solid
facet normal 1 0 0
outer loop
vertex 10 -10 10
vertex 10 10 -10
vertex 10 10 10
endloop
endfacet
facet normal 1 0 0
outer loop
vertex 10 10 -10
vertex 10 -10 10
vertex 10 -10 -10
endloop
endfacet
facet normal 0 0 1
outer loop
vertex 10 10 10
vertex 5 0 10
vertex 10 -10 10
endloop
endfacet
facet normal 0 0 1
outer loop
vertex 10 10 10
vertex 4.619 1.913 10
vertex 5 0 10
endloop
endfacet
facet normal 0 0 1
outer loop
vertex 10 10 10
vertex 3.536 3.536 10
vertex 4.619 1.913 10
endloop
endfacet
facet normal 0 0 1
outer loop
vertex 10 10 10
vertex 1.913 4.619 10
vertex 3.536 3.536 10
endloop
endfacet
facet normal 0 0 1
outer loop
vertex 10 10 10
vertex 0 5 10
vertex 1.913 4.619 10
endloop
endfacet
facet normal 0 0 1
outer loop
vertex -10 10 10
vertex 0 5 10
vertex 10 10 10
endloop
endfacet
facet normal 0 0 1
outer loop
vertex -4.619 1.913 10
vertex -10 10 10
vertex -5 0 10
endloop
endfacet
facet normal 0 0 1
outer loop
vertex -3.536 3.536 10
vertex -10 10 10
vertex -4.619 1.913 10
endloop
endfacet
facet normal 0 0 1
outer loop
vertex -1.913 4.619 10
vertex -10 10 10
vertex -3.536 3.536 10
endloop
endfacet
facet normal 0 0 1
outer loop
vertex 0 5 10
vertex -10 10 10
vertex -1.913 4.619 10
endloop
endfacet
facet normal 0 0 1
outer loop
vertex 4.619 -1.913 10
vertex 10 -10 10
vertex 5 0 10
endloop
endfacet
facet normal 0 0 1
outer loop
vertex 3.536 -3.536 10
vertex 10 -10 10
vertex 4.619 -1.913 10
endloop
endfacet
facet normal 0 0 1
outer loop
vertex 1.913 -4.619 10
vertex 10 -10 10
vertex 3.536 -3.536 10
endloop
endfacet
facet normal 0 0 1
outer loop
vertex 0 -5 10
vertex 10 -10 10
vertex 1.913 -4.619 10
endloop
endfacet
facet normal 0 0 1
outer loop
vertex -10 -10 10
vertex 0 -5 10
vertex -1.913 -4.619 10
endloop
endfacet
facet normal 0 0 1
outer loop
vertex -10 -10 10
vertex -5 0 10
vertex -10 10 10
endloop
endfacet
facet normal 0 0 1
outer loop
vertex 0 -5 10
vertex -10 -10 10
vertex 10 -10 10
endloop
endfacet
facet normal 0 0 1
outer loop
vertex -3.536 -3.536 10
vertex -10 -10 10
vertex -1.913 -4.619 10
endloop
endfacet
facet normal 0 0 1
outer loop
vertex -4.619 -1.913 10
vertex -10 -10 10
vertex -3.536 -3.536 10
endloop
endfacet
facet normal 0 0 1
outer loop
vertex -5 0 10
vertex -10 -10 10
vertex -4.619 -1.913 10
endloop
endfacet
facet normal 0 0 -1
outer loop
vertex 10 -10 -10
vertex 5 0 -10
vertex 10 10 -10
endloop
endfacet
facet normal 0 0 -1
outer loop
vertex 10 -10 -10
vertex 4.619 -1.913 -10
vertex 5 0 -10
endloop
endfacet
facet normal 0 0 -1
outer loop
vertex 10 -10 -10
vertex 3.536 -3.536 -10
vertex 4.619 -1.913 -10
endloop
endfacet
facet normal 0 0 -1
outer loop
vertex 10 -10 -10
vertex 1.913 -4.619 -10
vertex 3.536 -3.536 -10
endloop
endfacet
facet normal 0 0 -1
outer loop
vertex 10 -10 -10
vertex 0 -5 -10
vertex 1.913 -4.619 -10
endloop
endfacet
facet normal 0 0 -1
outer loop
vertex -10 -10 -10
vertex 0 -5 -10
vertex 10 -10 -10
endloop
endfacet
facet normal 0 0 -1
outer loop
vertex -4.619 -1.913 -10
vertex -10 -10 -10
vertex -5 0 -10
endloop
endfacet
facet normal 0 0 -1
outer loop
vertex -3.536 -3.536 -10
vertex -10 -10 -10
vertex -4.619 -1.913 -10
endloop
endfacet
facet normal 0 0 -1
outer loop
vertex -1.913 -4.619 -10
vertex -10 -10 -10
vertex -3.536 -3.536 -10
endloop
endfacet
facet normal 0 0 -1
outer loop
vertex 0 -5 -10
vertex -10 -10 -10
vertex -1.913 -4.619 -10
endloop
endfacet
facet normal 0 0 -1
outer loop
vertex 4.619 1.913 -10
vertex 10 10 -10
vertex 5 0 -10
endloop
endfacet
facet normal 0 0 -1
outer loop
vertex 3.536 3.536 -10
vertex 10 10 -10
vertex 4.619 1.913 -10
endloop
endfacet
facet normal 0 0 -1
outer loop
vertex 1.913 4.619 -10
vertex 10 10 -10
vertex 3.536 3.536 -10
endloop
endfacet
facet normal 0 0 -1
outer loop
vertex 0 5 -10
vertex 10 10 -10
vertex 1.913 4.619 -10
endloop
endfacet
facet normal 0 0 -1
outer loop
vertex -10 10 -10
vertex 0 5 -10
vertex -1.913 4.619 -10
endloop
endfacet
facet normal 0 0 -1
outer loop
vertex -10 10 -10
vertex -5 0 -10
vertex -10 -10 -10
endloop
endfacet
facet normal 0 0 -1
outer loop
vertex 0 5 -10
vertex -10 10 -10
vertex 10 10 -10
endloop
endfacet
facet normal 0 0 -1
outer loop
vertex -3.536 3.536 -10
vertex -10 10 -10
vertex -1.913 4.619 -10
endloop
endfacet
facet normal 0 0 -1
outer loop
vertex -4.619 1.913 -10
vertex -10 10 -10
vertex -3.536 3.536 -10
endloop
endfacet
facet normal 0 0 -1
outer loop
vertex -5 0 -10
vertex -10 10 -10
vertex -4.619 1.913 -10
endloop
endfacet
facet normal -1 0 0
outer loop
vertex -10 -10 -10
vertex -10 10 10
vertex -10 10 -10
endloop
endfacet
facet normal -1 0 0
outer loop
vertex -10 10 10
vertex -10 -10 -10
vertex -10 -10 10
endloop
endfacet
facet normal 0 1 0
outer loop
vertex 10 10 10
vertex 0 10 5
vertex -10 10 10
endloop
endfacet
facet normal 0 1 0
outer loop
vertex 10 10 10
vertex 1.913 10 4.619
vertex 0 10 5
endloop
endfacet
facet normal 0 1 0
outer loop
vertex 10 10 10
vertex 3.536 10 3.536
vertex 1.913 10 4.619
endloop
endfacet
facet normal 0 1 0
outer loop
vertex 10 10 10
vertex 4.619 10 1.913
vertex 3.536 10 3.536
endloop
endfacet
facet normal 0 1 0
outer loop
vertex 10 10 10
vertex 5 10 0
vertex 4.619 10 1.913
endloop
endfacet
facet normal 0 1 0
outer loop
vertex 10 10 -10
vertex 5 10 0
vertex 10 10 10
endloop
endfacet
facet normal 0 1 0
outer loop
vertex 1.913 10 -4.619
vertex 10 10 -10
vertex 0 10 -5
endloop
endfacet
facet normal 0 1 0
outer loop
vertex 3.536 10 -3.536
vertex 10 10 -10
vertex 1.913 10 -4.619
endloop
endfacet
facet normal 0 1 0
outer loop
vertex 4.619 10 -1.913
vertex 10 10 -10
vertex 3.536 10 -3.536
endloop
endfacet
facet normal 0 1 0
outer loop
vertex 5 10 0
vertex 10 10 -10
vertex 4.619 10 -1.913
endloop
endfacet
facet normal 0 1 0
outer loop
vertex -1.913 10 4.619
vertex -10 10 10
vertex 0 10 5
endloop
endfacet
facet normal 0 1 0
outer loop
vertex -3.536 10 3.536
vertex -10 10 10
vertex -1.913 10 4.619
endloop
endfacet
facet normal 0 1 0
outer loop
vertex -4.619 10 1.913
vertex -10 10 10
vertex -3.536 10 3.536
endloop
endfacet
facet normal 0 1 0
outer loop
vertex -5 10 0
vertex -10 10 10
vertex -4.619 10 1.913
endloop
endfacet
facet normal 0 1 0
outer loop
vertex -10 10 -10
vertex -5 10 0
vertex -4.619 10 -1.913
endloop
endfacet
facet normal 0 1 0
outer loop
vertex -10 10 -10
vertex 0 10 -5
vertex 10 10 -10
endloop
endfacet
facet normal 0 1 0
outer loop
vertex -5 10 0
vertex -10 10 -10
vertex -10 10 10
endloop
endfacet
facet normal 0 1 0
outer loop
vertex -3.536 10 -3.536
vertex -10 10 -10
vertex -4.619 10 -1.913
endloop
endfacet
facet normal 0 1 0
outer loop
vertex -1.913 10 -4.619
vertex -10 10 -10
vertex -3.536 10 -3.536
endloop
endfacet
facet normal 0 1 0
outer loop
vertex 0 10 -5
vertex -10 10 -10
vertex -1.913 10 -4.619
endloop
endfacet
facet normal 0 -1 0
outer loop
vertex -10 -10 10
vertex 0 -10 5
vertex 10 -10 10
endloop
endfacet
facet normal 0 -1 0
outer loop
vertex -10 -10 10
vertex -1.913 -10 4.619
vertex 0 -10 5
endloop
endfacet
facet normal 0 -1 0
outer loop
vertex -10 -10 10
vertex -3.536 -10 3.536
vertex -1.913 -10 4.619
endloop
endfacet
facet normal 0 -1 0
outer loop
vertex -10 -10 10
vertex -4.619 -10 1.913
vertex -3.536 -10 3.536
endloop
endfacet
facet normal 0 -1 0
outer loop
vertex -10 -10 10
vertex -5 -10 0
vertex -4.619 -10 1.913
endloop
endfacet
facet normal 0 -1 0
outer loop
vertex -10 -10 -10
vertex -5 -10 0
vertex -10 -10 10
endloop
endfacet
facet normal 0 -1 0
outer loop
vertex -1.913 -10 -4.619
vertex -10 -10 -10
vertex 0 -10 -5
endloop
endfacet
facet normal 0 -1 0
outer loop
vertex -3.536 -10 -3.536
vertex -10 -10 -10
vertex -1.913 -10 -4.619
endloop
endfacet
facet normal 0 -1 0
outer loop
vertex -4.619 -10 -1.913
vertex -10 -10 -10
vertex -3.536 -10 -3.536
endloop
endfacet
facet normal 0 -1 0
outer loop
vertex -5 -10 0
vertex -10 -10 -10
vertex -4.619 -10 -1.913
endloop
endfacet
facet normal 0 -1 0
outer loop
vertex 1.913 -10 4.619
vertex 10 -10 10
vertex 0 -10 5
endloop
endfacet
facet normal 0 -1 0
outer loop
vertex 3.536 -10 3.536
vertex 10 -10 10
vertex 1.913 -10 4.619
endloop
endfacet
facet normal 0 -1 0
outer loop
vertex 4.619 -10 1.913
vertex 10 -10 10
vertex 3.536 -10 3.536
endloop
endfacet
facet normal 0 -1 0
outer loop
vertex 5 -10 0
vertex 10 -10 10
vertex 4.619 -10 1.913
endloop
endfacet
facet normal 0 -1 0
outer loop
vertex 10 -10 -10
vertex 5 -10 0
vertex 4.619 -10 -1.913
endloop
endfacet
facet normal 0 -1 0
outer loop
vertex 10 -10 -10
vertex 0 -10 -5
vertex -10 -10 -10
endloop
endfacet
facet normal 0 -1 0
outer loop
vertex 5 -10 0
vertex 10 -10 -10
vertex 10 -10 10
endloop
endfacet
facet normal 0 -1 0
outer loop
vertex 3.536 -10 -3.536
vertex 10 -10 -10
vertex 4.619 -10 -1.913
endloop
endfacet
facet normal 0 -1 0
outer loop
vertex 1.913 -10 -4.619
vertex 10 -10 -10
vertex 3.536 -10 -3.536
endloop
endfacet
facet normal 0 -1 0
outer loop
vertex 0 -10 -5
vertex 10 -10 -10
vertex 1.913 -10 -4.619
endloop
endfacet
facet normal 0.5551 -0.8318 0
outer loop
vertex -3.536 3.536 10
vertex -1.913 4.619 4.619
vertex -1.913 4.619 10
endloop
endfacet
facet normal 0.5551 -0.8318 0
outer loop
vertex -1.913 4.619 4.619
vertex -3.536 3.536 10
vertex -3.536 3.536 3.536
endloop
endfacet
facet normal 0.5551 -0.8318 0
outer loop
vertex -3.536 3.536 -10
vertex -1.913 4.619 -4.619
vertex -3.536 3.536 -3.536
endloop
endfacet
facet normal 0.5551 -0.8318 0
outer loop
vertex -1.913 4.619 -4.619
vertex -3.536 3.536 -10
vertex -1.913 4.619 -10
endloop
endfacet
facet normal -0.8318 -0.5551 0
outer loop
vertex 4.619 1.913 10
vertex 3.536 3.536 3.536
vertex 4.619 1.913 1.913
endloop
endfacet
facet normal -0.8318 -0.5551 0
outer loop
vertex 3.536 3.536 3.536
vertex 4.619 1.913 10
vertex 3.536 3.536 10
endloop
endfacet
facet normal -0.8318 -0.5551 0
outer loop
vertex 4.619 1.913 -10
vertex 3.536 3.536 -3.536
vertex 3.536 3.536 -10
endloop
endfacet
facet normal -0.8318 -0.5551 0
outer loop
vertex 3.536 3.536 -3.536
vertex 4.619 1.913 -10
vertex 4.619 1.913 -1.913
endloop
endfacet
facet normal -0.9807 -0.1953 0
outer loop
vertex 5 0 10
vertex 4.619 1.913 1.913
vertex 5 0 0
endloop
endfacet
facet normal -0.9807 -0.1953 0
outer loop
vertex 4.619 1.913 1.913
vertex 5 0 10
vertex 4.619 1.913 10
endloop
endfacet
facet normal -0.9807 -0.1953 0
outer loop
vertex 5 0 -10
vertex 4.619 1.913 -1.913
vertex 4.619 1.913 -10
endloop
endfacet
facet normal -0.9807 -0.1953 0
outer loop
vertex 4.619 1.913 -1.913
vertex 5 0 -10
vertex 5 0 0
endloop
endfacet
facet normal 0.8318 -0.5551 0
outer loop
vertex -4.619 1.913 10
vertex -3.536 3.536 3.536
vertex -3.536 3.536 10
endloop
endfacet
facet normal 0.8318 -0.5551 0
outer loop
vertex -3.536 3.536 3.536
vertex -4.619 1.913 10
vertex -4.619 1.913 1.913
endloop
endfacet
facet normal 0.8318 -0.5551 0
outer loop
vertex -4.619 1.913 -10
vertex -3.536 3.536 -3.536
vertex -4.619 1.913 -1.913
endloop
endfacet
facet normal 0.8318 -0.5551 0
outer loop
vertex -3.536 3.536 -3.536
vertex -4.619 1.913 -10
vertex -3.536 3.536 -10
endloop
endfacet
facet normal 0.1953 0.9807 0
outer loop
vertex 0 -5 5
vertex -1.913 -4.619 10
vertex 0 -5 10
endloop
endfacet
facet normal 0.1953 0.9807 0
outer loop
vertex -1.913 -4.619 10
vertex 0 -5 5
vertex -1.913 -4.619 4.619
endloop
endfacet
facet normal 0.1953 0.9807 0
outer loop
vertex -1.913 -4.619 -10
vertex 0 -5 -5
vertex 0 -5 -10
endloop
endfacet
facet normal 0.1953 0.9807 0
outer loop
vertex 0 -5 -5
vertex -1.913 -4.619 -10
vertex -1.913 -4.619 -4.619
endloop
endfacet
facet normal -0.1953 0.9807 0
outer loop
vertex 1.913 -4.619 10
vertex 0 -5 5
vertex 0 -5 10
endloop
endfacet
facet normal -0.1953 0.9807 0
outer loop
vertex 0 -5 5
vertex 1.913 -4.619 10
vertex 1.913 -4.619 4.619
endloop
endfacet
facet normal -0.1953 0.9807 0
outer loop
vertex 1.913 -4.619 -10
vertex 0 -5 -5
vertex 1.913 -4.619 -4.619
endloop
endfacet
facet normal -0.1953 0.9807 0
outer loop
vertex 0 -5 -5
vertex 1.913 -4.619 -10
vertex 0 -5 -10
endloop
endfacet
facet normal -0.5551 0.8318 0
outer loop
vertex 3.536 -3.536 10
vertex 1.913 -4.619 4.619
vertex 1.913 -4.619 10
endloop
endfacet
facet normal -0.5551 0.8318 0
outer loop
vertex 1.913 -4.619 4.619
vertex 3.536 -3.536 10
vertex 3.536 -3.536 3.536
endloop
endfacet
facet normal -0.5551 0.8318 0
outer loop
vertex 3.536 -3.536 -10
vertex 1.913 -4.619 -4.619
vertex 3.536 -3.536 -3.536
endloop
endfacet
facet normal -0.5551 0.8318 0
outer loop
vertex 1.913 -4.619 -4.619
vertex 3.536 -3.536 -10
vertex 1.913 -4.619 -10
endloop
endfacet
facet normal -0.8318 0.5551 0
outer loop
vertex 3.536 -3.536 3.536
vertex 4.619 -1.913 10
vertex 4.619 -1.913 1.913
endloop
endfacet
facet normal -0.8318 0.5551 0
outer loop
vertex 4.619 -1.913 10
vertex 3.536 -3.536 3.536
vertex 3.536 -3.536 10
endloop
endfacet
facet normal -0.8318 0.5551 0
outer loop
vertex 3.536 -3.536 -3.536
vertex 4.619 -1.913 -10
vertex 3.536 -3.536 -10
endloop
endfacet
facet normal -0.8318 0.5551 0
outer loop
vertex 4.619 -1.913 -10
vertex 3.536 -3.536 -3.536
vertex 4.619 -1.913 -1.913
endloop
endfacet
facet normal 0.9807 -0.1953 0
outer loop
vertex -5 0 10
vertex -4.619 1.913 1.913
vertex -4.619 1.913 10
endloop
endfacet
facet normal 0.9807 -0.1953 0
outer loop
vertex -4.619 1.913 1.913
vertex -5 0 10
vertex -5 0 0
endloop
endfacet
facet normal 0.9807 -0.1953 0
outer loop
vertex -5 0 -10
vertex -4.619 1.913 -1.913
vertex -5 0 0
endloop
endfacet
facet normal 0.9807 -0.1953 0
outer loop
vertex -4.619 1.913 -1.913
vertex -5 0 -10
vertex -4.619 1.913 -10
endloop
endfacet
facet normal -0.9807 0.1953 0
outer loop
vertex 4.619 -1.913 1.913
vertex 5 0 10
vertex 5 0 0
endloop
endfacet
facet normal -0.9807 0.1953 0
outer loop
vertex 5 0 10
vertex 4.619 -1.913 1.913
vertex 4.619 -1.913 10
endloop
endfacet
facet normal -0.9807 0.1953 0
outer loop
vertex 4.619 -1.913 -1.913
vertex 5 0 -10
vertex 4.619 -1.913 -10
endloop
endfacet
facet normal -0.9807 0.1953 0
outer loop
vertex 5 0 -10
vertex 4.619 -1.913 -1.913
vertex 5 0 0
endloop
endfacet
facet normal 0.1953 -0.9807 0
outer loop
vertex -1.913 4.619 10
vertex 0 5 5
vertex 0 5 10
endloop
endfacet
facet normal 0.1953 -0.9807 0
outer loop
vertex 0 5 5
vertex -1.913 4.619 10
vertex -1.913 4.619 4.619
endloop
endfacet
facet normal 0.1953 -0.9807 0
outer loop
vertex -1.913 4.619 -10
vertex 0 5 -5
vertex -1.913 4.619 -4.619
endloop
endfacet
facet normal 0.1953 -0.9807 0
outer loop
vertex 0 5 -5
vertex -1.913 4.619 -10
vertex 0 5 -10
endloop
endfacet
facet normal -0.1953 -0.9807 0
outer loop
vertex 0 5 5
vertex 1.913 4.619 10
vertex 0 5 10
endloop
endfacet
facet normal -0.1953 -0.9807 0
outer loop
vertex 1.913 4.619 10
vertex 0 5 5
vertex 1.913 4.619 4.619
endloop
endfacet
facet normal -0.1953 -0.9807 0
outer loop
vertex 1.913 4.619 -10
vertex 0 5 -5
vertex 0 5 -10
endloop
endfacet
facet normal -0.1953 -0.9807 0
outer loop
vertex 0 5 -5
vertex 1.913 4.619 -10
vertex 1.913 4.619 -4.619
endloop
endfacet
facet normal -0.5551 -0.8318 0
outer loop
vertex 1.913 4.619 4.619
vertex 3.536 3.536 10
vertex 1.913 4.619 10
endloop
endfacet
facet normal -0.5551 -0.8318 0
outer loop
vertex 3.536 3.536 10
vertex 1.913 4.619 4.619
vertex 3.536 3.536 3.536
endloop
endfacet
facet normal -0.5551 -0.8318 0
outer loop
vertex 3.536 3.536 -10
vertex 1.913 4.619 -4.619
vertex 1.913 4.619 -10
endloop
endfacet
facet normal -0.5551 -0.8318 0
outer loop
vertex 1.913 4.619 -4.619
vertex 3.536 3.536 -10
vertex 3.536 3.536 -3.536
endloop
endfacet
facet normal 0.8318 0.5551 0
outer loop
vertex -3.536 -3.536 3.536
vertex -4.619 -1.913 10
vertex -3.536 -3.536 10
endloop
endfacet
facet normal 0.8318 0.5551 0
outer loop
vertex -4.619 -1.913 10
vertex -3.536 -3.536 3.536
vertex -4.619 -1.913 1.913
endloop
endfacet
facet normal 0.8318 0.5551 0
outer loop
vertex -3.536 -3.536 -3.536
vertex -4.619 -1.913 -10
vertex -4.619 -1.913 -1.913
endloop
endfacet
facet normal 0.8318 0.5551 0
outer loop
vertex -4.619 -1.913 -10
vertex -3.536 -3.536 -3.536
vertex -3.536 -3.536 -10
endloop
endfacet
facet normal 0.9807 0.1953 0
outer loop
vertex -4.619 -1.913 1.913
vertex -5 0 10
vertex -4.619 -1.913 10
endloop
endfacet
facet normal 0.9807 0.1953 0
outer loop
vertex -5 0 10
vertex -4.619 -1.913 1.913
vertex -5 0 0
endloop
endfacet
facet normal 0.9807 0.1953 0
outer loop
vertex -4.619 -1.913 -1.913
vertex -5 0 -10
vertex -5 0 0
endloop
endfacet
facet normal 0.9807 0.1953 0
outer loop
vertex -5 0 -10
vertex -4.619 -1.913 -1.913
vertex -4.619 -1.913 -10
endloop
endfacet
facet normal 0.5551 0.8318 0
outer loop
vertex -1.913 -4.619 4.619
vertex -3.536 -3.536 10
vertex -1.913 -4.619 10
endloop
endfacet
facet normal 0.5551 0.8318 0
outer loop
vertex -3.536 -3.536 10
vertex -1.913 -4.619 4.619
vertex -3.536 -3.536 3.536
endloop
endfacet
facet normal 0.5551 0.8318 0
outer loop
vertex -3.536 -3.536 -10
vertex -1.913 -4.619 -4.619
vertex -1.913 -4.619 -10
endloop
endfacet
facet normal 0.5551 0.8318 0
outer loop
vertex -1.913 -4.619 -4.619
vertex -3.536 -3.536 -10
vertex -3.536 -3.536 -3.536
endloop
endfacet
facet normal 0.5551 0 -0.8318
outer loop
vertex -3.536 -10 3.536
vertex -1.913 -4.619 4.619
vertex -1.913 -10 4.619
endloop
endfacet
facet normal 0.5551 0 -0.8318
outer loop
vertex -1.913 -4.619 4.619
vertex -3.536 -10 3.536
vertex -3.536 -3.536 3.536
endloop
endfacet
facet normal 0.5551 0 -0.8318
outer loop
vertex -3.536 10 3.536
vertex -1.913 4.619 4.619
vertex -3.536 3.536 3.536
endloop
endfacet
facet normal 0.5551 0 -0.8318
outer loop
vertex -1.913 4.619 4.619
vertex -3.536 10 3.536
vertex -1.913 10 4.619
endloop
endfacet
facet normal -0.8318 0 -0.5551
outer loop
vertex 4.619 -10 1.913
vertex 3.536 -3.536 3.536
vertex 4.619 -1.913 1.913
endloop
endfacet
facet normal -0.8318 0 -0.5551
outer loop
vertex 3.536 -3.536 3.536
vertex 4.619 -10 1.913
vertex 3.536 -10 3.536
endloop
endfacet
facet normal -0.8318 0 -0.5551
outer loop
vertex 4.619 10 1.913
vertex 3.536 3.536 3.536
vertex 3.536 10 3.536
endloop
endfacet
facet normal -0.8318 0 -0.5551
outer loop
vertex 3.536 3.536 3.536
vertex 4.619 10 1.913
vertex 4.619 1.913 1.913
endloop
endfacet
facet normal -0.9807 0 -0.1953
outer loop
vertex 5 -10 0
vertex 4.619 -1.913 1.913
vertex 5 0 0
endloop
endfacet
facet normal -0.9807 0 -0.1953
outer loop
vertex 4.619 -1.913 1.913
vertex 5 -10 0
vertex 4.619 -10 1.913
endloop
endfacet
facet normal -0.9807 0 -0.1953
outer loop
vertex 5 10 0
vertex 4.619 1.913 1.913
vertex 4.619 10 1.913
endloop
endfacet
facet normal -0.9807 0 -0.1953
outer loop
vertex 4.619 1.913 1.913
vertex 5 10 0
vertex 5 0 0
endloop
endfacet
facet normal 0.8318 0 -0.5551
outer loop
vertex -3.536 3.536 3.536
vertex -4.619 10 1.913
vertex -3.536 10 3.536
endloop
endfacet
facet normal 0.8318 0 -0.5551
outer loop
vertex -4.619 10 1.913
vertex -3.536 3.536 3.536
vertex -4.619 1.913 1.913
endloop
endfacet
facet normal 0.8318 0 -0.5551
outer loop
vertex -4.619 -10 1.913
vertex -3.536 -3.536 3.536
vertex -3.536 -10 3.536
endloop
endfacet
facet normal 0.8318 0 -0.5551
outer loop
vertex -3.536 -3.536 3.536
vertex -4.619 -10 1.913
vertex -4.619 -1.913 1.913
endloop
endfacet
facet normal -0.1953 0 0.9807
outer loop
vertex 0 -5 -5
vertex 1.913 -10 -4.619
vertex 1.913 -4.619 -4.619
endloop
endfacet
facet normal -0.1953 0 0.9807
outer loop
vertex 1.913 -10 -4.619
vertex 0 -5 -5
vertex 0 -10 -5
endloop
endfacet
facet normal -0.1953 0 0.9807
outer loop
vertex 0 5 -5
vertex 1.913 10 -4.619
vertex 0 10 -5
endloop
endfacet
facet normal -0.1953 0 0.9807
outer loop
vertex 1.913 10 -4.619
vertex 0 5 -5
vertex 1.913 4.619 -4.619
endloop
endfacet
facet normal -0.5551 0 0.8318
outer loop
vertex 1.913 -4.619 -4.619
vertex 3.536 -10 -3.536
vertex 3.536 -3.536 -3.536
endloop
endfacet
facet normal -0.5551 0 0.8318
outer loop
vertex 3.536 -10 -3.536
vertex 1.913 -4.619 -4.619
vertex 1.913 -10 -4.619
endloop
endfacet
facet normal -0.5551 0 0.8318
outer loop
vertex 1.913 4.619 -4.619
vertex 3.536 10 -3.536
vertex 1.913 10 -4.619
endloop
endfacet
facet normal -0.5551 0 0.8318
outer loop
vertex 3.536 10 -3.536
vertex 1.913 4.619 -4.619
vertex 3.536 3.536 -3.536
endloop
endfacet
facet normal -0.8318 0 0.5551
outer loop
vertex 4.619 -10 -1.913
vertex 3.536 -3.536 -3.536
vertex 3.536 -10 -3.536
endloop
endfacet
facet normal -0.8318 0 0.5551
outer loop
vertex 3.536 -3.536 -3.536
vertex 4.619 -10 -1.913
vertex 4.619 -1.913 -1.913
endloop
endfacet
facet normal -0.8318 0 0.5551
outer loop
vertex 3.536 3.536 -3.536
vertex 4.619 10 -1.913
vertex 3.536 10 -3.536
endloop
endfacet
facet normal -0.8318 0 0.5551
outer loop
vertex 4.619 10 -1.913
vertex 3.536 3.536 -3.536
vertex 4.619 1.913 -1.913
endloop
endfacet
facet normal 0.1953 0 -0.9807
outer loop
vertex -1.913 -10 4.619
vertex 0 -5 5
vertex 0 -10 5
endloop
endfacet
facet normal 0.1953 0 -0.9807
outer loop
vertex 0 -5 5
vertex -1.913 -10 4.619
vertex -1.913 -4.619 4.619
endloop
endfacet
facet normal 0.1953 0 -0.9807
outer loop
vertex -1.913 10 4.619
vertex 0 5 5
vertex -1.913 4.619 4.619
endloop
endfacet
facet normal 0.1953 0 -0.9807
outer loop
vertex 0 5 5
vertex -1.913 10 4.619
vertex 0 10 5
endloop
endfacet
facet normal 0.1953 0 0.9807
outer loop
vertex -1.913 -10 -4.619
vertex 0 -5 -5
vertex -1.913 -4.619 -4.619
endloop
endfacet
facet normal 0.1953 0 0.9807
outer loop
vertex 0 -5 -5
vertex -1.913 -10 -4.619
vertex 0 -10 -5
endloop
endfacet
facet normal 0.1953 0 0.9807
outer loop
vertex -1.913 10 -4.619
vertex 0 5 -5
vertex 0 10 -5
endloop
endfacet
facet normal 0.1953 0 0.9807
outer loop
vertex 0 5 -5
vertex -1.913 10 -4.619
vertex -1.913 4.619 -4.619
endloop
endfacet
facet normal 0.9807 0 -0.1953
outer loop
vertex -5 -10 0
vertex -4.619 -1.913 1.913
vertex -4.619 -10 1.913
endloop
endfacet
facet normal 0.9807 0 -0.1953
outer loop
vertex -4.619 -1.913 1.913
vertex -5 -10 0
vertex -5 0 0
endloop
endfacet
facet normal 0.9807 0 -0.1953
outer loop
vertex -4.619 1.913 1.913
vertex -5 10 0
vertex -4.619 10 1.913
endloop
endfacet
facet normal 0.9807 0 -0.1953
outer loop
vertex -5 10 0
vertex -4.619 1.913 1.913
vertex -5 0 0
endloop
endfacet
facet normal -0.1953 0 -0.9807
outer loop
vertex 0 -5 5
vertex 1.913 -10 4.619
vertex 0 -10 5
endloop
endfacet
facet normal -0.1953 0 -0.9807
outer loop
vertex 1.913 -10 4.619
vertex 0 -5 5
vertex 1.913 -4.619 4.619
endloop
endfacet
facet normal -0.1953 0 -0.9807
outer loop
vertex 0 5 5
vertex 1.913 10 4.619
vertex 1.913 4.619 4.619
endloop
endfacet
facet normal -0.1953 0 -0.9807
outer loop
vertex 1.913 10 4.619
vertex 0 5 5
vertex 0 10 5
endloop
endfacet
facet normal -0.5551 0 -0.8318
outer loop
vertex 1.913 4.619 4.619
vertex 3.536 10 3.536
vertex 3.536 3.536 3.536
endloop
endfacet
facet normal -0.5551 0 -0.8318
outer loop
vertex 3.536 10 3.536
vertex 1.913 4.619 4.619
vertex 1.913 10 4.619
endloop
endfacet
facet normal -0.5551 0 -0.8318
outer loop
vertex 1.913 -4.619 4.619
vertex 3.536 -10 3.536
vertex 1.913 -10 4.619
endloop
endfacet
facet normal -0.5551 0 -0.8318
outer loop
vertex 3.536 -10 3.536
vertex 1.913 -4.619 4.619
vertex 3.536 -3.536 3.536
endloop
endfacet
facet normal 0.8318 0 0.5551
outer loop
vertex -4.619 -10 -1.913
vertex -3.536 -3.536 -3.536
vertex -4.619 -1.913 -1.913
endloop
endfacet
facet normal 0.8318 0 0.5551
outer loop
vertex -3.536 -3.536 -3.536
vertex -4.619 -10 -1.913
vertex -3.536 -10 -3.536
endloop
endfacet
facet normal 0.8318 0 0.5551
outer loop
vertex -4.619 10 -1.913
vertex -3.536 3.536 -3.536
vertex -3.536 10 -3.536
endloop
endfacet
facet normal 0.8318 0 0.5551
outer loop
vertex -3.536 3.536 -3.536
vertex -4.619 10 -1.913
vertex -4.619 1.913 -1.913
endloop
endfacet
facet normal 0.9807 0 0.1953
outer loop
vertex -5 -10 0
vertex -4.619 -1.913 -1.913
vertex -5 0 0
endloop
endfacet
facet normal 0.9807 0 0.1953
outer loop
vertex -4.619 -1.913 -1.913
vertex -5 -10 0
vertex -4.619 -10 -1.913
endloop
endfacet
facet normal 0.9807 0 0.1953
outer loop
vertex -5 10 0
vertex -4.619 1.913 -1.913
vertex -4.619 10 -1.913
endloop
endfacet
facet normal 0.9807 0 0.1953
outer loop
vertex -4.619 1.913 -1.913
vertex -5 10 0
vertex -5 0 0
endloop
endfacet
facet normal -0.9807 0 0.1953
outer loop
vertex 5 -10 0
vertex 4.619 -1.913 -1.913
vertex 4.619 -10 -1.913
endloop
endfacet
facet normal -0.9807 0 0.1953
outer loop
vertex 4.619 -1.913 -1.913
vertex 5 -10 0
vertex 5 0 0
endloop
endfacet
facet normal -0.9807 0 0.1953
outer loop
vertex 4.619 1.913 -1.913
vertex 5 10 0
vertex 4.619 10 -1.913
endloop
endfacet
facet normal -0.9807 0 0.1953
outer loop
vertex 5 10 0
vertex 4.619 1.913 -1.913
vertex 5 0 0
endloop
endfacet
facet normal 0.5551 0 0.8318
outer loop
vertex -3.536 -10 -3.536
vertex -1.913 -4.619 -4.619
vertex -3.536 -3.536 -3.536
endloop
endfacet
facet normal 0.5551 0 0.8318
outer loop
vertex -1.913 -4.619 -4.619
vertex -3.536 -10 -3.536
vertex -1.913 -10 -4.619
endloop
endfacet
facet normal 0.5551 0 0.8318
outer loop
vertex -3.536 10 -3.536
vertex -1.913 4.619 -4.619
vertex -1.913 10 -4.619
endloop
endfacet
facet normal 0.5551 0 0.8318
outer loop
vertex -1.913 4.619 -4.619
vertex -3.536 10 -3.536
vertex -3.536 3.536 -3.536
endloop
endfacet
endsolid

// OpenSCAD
cube_size = 20;
hole_radius = 5;
hole_height = 21;
facets = 16;
difference() {
    cube([cube_size, cube_size, cube_size], center=true);
    cylinder(h=hole_height, r=hole_radius, center=true, $fn=facets);
    rotate([90, 0, 0]) cylinder(h=hole_height, r=hole_radius, center=true, $fn=facets);
}
